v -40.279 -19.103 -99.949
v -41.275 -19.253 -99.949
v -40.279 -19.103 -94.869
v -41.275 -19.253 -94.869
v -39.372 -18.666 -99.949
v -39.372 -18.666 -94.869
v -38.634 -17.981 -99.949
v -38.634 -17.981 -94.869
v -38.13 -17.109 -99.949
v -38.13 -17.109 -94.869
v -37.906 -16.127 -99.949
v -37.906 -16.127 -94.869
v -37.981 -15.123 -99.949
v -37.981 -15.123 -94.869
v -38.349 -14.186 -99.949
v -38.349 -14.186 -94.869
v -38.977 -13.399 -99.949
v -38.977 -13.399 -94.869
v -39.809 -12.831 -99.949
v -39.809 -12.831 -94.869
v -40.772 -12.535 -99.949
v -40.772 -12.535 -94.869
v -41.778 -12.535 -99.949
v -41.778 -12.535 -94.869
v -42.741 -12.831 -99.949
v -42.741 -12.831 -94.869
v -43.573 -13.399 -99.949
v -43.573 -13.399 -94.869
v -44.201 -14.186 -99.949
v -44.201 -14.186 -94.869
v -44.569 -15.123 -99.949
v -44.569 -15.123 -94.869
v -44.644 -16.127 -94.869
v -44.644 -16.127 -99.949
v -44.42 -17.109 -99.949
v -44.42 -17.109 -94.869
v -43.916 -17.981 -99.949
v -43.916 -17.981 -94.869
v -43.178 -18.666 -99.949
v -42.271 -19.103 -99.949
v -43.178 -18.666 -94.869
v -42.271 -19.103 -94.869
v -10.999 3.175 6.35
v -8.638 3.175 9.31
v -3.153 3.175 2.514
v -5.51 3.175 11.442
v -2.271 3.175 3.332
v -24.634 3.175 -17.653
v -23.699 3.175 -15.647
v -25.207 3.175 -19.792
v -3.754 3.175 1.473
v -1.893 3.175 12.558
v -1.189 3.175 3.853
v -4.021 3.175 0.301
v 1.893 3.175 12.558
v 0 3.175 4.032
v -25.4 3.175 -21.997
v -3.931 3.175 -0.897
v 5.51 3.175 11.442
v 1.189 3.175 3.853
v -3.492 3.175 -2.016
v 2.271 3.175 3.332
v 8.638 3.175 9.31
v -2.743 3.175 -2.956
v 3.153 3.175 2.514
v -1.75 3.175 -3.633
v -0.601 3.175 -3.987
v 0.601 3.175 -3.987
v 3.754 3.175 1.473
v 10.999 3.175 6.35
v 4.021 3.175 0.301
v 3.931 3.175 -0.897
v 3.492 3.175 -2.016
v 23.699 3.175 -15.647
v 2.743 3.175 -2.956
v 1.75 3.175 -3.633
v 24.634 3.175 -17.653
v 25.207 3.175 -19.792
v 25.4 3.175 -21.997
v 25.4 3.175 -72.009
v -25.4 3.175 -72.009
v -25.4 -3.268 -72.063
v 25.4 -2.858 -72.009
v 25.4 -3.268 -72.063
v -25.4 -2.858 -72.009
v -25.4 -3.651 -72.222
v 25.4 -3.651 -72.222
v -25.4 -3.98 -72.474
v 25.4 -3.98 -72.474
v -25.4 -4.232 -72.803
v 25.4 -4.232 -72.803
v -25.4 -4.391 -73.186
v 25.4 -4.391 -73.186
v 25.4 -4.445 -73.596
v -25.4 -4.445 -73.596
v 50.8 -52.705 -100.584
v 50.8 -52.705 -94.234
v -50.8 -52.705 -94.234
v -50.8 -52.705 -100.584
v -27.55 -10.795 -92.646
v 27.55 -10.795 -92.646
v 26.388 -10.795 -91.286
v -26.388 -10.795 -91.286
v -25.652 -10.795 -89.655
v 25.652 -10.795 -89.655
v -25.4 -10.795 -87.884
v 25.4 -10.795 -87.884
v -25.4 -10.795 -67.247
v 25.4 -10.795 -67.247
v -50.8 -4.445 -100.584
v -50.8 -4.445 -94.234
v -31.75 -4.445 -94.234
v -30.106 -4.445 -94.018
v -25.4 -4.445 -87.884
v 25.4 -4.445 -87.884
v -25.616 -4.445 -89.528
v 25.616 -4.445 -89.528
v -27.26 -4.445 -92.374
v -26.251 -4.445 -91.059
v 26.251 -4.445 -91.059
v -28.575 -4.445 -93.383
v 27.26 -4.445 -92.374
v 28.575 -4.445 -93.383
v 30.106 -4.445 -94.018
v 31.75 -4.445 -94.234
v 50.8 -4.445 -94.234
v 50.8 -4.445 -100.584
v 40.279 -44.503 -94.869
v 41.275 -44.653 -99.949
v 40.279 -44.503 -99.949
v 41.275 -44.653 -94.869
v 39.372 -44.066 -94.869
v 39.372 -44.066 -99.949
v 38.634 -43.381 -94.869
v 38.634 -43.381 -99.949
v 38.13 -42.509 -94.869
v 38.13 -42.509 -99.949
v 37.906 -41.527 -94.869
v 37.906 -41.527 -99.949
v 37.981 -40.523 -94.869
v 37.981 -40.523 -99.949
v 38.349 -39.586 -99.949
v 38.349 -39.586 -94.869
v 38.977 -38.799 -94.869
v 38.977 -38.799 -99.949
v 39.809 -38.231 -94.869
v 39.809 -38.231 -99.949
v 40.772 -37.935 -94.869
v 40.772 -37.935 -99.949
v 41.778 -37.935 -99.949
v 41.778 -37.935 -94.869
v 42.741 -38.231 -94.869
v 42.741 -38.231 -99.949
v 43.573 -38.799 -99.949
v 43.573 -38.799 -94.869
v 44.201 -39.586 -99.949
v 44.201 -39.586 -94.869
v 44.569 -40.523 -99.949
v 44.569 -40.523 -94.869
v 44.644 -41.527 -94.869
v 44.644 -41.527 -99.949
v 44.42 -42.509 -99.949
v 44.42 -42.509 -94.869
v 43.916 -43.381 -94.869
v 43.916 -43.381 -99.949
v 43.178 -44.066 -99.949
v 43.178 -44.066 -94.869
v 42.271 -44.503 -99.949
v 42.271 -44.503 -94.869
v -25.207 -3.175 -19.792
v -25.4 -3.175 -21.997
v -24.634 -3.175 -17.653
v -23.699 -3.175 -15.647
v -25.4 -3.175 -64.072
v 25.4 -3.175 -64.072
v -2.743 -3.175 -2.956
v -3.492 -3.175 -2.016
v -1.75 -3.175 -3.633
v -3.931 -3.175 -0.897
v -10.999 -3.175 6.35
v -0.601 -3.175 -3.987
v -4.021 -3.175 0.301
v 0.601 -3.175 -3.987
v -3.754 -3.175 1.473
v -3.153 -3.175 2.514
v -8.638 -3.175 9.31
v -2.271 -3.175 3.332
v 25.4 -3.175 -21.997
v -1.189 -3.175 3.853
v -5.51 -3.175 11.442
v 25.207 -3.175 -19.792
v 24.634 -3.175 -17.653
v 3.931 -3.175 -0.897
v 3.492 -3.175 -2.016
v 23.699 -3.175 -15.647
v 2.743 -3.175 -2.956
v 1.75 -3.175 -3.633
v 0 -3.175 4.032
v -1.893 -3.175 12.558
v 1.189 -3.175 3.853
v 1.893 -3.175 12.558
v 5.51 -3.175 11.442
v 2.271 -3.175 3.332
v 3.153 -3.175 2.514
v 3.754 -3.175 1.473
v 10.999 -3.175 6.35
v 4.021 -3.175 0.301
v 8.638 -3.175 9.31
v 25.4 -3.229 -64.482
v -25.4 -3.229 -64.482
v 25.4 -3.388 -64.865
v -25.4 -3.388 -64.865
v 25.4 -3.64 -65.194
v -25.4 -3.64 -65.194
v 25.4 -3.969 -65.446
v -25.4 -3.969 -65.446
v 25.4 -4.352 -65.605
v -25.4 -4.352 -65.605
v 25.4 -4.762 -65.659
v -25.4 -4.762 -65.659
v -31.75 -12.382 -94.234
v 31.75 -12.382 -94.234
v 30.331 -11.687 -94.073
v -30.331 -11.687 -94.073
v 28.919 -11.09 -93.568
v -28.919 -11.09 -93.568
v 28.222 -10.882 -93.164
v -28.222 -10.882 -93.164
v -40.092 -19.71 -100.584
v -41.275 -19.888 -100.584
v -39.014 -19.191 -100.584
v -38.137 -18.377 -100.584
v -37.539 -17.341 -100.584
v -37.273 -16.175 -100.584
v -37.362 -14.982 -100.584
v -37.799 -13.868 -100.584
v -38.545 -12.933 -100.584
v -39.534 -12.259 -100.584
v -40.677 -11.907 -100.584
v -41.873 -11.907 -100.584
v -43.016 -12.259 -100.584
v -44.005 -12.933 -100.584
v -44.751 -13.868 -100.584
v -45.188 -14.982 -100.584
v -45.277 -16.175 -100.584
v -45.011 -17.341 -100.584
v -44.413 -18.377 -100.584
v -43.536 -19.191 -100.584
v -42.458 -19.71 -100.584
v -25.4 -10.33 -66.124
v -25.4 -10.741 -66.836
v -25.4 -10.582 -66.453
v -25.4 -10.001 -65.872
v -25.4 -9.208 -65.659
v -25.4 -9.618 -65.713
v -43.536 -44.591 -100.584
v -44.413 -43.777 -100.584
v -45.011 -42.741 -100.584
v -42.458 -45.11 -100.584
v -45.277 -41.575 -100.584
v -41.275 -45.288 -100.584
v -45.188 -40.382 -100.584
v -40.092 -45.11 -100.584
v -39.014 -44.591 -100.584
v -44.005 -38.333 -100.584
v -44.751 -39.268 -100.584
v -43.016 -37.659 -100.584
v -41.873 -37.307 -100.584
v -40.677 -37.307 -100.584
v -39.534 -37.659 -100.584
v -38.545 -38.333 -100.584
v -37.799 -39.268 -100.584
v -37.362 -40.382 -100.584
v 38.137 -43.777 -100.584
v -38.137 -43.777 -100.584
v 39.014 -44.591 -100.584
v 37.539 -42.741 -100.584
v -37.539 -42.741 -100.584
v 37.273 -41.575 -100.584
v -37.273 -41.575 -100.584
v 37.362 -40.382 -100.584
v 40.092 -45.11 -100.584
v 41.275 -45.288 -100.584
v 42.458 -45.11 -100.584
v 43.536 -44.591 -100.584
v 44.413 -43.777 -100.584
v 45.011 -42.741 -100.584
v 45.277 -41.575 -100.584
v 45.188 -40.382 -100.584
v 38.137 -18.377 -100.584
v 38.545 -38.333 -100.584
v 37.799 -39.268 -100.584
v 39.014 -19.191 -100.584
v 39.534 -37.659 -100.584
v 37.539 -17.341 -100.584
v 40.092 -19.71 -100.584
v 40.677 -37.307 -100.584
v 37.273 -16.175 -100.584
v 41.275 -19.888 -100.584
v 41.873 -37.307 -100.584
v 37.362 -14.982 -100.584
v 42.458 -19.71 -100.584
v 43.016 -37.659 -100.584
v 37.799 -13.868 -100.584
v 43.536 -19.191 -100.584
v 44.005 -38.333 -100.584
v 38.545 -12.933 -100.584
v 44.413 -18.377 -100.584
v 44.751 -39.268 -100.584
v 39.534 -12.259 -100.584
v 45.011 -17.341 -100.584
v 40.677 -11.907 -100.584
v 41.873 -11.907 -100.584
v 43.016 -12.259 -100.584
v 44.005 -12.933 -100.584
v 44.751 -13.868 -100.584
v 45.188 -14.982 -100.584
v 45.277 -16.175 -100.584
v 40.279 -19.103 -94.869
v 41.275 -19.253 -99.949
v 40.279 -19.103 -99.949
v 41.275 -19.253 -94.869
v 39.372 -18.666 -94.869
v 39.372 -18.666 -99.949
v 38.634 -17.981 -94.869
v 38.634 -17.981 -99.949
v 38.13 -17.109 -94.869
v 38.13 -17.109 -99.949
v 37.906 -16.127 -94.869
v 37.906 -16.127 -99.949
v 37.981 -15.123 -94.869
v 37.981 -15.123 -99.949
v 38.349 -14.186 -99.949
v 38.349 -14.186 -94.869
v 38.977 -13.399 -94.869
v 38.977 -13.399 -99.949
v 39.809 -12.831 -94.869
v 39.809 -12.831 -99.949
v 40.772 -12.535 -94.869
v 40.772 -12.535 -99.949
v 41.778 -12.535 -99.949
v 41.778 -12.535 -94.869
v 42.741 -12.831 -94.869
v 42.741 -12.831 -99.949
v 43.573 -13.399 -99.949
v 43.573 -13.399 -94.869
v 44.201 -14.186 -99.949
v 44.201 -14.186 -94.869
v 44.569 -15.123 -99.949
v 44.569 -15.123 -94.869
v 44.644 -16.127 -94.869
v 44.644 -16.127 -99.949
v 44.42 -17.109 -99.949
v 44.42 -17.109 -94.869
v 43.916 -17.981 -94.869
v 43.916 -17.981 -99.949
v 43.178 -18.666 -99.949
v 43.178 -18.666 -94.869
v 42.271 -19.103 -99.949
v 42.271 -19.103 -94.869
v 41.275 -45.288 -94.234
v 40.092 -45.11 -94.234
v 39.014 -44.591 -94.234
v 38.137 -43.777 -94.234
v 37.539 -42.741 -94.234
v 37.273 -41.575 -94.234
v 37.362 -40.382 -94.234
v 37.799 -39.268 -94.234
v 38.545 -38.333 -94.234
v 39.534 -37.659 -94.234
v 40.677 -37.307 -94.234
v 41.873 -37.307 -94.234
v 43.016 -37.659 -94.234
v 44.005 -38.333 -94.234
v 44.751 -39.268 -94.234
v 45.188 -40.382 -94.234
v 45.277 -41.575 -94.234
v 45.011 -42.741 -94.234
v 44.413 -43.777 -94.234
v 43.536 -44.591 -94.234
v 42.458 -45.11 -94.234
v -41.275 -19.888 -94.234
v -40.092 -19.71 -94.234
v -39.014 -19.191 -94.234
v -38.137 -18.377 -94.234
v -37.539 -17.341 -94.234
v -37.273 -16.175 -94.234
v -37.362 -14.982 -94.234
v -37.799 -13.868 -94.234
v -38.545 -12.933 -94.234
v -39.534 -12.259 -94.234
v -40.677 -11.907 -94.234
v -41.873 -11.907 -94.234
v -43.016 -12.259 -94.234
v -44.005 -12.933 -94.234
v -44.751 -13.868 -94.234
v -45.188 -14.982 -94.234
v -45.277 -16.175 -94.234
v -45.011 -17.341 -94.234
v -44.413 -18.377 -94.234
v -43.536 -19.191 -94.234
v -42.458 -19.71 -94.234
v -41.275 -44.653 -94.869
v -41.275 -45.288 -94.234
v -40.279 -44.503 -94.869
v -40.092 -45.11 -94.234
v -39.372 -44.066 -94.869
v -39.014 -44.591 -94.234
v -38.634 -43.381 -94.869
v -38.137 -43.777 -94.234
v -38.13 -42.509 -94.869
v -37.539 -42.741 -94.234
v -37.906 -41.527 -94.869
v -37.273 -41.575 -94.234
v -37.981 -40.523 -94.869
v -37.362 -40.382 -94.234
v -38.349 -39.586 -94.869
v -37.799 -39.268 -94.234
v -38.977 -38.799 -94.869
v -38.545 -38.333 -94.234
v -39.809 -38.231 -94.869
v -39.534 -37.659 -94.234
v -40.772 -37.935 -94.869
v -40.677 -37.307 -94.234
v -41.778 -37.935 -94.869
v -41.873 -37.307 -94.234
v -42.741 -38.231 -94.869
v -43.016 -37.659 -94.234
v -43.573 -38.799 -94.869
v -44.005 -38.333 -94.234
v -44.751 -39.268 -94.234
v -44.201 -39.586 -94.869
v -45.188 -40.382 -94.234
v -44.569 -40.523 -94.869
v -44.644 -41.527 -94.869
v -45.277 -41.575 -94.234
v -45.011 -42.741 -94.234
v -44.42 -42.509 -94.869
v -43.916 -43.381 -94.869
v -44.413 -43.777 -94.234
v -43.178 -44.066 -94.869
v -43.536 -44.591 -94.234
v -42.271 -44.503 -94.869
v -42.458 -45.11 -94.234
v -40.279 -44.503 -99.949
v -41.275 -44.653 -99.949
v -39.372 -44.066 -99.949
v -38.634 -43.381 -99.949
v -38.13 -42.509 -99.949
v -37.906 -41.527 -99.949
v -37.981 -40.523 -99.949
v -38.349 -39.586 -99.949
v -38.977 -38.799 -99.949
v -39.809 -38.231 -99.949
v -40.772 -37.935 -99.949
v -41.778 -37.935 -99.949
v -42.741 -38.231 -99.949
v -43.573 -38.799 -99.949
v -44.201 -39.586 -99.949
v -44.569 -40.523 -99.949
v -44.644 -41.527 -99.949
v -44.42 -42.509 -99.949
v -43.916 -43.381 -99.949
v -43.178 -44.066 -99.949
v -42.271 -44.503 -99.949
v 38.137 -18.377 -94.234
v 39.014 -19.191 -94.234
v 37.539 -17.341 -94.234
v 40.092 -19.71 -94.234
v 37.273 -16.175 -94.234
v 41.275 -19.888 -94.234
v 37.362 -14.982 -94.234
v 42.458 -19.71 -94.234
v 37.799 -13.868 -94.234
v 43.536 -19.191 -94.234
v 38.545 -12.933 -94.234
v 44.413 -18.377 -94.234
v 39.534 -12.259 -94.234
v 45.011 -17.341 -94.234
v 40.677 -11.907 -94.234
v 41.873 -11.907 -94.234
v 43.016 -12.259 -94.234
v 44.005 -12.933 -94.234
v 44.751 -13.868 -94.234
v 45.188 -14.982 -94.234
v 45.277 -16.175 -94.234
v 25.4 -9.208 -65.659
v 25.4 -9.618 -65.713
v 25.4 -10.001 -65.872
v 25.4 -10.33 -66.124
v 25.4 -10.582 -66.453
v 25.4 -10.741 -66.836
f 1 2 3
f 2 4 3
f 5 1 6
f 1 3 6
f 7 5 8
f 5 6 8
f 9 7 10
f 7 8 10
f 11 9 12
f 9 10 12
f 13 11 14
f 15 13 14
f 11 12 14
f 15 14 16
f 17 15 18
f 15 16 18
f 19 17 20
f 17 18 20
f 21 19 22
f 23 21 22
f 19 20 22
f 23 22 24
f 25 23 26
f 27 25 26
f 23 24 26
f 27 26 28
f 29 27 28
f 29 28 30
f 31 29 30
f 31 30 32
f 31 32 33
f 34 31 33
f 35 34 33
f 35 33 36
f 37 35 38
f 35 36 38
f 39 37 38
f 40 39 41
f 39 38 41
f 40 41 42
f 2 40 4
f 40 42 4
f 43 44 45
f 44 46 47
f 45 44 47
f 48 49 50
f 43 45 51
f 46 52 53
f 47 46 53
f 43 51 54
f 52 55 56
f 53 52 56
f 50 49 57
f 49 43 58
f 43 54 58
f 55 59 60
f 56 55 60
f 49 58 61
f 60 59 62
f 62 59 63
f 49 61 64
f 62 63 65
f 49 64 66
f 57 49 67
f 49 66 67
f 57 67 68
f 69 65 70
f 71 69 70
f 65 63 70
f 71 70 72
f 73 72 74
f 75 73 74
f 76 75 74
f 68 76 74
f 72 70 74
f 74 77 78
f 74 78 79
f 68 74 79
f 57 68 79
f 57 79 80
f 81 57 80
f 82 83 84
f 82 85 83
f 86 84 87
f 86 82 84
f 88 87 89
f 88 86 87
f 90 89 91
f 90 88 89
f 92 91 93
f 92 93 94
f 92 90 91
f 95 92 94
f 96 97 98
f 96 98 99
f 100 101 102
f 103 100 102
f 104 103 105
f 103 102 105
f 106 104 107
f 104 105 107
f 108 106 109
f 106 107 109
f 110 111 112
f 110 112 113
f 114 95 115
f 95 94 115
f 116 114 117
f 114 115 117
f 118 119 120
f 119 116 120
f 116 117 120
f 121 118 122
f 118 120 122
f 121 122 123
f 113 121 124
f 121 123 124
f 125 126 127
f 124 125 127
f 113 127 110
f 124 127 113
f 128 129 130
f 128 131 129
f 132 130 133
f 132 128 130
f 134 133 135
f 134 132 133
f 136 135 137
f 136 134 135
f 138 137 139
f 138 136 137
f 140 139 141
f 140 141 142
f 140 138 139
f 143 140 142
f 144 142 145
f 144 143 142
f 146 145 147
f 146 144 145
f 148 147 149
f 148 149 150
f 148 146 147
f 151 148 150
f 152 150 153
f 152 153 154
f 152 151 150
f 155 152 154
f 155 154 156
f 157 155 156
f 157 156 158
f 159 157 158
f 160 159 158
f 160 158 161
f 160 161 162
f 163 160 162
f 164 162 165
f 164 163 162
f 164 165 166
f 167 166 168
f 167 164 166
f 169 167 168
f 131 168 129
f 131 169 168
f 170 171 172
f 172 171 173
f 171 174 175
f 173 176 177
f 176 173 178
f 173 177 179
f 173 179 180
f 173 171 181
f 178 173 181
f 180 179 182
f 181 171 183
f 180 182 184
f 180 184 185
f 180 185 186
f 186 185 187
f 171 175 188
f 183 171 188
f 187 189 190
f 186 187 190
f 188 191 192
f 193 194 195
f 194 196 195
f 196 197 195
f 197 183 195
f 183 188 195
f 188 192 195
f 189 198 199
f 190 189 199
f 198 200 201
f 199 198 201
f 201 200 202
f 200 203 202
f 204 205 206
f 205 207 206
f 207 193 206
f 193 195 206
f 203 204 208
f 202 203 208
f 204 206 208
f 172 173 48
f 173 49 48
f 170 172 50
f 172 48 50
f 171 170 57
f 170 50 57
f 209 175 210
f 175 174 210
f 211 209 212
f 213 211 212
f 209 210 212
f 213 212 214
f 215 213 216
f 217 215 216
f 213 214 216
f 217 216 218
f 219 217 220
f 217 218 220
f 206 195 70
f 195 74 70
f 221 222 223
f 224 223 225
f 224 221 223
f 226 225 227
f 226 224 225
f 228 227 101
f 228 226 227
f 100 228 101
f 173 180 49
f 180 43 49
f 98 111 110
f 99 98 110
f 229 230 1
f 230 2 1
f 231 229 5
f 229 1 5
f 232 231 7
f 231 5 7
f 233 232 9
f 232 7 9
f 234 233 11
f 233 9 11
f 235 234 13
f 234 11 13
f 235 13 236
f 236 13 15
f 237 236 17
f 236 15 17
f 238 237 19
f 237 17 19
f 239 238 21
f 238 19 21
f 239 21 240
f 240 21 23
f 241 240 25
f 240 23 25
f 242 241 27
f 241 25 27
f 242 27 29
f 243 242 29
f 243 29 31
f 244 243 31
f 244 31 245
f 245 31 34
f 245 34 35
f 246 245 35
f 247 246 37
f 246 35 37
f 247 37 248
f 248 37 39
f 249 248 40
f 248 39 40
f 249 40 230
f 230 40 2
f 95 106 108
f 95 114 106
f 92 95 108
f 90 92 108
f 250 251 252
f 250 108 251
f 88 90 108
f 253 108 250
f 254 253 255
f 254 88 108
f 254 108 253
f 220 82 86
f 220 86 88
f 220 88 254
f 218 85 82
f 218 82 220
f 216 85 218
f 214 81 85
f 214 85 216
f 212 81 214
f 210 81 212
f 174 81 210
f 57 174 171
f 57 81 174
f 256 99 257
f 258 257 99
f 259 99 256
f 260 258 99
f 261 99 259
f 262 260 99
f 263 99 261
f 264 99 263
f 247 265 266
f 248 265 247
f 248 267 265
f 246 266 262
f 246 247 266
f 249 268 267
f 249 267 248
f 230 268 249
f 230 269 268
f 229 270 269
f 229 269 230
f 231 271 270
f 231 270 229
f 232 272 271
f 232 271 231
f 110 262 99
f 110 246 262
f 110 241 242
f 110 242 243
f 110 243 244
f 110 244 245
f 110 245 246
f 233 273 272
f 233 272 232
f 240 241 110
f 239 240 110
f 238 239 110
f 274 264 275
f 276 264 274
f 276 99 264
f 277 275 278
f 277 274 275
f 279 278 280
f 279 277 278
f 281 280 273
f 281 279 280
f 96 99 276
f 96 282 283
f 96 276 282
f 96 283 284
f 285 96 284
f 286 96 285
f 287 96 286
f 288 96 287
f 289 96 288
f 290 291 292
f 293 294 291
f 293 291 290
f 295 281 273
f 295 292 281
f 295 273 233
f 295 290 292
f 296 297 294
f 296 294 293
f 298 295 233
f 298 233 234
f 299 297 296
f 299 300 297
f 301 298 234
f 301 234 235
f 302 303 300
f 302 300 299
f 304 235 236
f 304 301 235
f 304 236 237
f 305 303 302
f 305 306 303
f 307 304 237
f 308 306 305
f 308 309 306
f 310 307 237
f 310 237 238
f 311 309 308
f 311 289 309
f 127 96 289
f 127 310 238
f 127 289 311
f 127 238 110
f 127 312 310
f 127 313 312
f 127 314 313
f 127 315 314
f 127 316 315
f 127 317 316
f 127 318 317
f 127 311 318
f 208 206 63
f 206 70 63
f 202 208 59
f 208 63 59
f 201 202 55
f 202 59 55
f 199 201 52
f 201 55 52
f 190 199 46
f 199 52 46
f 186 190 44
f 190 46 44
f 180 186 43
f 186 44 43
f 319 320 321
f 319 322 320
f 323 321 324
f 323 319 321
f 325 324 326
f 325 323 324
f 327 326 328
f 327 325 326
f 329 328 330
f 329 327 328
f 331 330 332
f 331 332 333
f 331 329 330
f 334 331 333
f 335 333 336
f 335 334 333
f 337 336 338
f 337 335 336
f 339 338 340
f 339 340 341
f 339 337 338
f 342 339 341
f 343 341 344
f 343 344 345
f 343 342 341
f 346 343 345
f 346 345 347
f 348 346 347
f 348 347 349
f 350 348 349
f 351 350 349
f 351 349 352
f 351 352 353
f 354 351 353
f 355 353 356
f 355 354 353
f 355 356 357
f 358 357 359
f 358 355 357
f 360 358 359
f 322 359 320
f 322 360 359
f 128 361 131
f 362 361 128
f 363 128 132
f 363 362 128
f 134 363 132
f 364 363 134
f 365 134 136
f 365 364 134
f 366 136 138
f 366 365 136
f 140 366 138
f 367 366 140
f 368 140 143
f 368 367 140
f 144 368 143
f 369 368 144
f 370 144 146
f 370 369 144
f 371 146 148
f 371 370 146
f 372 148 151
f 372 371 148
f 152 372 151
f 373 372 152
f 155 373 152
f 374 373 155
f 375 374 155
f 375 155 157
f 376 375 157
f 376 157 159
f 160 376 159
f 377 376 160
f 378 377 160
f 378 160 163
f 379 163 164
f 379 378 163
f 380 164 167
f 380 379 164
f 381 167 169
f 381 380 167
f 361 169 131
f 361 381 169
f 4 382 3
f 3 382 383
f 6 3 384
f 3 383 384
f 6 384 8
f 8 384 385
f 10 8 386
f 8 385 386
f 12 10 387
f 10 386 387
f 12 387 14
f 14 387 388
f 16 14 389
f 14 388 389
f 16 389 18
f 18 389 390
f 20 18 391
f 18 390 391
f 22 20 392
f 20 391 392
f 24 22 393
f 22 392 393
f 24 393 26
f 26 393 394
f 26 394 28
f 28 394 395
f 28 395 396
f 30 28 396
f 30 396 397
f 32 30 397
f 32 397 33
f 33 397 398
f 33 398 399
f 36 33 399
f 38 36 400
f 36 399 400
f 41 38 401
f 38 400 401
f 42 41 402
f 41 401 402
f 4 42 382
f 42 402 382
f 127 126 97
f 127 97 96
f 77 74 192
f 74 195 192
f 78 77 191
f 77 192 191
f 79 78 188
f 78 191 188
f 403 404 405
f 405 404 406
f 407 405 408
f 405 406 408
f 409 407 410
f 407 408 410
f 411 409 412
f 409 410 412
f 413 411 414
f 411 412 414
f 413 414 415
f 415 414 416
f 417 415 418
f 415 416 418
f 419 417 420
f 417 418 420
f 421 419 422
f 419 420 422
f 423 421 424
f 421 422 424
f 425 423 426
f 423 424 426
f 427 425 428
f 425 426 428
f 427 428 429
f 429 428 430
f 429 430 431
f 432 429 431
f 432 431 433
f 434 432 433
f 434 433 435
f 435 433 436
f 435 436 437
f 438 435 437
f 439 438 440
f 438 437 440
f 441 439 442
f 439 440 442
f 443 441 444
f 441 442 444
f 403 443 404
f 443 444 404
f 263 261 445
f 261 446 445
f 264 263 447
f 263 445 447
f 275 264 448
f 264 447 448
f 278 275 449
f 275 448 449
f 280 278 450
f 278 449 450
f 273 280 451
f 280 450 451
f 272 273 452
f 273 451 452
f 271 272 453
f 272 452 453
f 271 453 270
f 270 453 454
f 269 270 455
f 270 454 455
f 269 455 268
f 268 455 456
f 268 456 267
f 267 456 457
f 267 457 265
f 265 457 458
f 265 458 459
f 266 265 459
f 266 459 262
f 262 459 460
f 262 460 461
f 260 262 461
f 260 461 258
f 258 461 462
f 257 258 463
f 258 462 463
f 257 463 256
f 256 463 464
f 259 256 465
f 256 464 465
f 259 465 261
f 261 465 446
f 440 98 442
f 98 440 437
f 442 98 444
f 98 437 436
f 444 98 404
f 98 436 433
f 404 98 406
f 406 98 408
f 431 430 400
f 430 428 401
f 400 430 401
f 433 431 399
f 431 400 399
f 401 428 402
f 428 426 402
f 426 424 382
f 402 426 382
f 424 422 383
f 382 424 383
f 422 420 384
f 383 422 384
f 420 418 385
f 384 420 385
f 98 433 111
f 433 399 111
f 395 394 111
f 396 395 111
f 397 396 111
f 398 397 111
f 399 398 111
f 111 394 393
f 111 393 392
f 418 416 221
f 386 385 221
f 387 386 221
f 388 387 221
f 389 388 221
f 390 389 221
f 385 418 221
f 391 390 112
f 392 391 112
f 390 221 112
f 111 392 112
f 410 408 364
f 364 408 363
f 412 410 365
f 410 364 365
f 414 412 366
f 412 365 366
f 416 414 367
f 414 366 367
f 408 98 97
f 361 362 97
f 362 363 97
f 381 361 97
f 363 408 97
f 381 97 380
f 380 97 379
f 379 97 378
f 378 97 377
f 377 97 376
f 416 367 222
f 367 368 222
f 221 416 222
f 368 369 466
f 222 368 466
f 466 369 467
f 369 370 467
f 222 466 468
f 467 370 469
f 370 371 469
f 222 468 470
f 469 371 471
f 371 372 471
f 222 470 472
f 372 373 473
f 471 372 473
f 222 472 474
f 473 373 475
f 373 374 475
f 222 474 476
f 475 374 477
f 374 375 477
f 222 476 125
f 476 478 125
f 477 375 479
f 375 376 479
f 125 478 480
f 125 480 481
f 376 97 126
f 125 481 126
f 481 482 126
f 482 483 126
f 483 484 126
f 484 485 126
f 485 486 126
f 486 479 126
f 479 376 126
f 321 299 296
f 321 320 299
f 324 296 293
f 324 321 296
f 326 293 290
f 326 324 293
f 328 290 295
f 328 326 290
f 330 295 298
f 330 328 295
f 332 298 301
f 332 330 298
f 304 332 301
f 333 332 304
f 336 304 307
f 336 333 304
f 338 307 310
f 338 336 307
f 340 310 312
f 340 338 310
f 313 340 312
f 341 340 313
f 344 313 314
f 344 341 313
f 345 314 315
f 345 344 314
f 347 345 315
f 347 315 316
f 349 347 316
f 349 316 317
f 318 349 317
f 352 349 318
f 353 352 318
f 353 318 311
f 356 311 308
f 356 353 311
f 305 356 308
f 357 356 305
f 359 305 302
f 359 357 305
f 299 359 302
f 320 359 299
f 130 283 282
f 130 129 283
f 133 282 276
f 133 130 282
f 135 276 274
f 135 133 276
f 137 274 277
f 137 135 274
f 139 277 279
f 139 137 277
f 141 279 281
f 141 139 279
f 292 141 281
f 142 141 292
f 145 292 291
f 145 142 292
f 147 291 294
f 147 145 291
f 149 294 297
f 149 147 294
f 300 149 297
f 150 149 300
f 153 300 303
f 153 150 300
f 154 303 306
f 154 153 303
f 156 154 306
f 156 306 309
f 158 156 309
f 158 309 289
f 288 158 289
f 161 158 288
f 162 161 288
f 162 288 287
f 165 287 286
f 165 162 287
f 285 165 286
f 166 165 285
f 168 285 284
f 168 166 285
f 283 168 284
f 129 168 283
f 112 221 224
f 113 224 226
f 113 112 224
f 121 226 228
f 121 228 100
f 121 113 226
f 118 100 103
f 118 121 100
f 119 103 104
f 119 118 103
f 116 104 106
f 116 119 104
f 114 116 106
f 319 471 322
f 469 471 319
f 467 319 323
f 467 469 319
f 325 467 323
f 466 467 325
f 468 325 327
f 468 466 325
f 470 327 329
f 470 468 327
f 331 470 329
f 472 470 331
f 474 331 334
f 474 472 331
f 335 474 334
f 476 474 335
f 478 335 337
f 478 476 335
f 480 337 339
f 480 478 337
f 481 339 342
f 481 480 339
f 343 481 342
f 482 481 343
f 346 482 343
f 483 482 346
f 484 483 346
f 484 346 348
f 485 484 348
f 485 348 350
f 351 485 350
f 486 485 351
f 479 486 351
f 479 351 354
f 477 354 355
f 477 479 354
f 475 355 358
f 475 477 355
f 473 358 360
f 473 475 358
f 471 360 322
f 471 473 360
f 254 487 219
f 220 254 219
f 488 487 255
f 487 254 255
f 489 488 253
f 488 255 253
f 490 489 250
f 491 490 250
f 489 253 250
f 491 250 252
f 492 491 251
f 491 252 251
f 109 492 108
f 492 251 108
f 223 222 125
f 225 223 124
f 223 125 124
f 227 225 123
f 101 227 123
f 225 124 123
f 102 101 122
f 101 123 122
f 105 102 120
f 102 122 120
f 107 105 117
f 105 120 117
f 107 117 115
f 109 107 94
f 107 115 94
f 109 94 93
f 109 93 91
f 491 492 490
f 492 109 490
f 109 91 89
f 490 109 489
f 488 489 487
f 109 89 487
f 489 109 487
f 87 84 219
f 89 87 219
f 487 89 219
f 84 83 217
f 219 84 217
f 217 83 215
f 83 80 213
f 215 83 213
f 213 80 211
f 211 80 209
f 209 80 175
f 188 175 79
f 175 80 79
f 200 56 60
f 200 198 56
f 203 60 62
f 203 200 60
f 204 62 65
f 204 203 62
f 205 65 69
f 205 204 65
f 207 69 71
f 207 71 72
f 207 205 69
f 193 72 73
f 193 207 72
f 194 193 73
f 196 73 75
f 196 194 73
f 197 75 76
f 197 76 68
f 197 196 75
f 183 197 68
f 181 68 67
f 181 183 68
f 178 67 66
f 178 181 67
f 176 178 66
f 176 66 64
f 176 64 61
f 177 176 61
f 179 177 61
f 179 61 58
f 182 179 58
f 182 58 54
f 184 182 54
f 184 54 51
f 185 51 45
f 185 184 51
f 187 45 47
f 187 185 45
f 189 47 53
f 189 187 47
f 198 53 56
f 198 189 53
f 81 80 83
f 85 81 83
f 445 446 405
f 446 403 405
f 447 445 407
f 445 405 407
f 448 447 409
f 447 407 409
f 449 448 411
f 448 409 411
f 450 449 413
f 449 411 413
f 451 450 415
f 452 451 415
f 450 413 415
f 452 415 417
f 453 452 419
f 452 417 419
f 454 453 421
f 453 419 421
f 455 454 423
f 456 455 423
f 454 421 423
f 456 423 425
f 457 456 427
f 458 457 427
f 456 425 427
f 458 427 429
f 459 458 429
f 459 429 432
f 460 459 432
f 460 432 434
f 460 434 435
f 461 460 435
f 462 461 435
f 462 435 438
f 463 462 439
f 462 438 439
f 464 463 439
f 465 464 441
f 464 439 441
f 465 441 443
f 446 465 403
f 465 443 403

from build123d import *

# Parameters (mm, degrees)
SKETCH1_R                        = 4.03225
BOSS_EXTRUDE1_DEPTH              = 3.175
FILLET1_R                        = 12.7
EXTRUDE_THIN1_DEPTH              = 50.8
SKETCH3_W                        = 6.35
SKETCH3_H                        = 48.26
BOSS_EXTRUDE2_DEPTH              = 25.4
F_1_4_CLEARANCE_HOLE1_AT_2_COUNT = 2
F_1_4_CLEARANCE_HOLE1_AT_2_PITCH = 25.4
FILLET2_R                        = 6.35
FILLET3_R                        = 1.5875


with BuildPart() as part:
    # Sketch1 → Boss-Extrude1 (new, symmetric)
    with BuildSketch(Plane(origin=(0, 0, 0), x_dir=(1, 0, 0), z_dir=(0, 1, 0))):
        with BuildLine():
            Line((-25.4, 50.8), (25.4, 50.8))
            Line((25.4, 50.8), (25.4, 18.594090512))
            Line((25.4, 18.594090512), (10.998522628, -6.35))
            ThreePointArc((10.998522628, -6.35), (0, -12.7), (-10.998522628, -6.35))
            Line((-10.998522628, -6.35), (-25.4, 18.594090512))
            Line((-25.4, 18.594090512), (-25.4, 50.8))
        make_face()
        with Locations(Location((0, 0, 0), (0, 0, 270))):
            Circle(SKETCH1_R, mode=Mode.SUBTRACT)
    extrude(amount=BOSS_EXTRUDE1_DEPTH, both=True)

    # Fillet1
    fillet1_edges = [part.edges().sort_by_distance(p)[0] for p in [
        (25.4, 0, -18.594090512),
        (-25.4, 0, -18.594090512),
    ]]
    fillet(fillet1_edges, radius=FILLET1_R)

    # Sketch2 → Extrude-Thin1 (add)
    with BuildSketch(Plane(origin=(25.4, 0, 0), x_dir=(0, 0, -1), z_dir=(1, 0, 0))):
        Polygon((50.8, 3.175), (72.009, 3.175), (72.009, -4.445), (100.584, -4.445), (100.584, -52.705), (94.234, -52.705), (94.234, -10.795), (65.659, -10.795), (65.659, -3.175), (50.8, -3.175), align=None)
    extrude(amount=-EXTRUDE_THIN1_DEPTH)

    # Sketch3 → Boss-Extrude2 (add)
    with BuildSketch(Plane(origin=(25.4, 0, 0), x_dir=(0, 0, -1), z_dir=(1, 0, 0))):
        with Locations((97.409, -28.575)):
            Rectangle(SKETCH3_W, SKETCH3_H)
    boss_extrude2 = extrude(amount=BOSS_EXTRUDE2_DEPTH)

    # Sketch5 → 1/4 Clearance Hole1 (revolve, cut)
    with BuildSketch(Plane(origin=(41.275, -15.875, -94.234), x_dir=(0, -1, 0), z_dir=(1, 0, 0))):
        Polygon((0, 0), (0, 6.35), (4.0132, 6.35), (3.3782, 5.715), (3.3782, 0.635), (4.0132, 0), align=None)
    f_1_4_clearance_hole1 = revolve(axis=Axis((41.275, -15.875, -87.884), (0, 0, -1)), mode=Mode.SUBTRACT)

    # 1/4 Clearance Hole1 at 2: 1/4 Clearance Hole1 ×2
    with Locations(*[(0, -i * F_1_4_CLEARANCE_HOLE1_AT_2_PITCH, 0) for i in range(1, F_1_4_CLEARANCE_HOLE1_AT_2_COUNT)]):
        add(f_1_4_clearance_hole1, mode=Mode.SUBTRACT)

    # Mirror1: Boss-Extrude2, 1/4 Clearance Hole1 across plane
    add(boss_extrude2.mirror(Plane(origin=(0, 0, 0), x_dir=(0, 0, 1), z_dir=(1, 0, 0))))
    add(f_1_4_clearance_hole1.mirror(Plane(origin=(0, 0, 0), x_dir=(0, 0, 1), z_dir=(1, 0, 0))), mode=Mode.SUBTRACT)

    # Mirror1 copy 1 sketch → Mirror1 copy 1 (revolve, cut)
    with BuildSketch(Plane(origin=(-41.275, -41.275, -94.234), x_dir=(0, -1, 0), z_dir=(-1, 0, 0))):
        Polygon((0, 0), (0, -6.35), (4.0132, -6.35), (3.3782, -5.715), (3.3782, -0.635), (4.0132, 0), align=None)
    revolve(axis=Axis((-41.275, -41.275, -87.884), (0, 0, 1)), mode=Mode.SUBTRACT)

    # Fillet2
    fillet2_edges = [part.edges().sort_by_distance(p)[0] for p in [
        (25.4, -7.62, -94.234),
        (-25.4, -7.62, -94.234),
    ]]
    fillet(fillet2_edges, radius=FILLET2_R)

    # Fillet3
    fillet3_edges = [part.edges().sort_by_distance(p)[0] for p in [
        (0, -4.445, -72.009),
        (0, -3.175, -65.659),
        (0, -10.795, -65.659),
        (0, -10.795, -94.234),
    ]]
    fillet(fillet3_edges, radius=FILLET3_R)


solid = part.part
